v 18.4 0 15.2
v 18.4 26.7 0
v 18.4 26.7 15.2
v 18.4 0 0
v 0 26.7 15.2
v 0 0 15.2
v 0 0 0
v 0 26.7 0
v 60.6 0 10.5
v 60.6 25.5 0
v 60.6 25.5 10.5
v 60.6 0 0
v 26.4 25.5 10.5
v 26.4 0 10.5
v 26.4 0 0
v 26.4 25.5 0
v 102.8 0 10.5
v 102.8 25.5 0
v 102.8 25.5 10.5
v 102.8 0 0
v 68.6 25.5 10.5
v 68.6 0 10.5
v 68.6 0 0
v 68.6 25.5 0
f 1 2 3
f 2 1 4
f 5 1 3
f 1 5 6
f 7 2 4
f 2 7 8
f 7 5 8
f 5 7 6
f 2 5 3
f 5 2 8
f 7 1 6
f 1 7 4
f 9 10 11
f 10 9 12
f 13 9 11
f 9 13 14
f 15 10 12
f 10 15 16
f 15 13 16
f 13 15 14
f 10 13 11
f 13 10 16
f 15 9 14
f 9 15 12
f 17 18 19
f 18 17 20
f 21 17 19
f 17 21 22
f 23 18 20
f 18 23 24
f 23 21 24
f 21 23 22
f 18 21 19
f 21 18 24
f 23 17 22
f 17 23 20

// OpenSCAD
// 미니어처 화물 박스 (실물 /10) — 프린트용
// 단위 mm. OpenSCAD F6(렌더) 후 F7(Export STL).
// 편하중은 기하 중심으로 판정 → 솔리드로 뽑아도 무방(shell=0).

scale_k = 10;          // 축척비

// 실물 치수 mm [W, D, H]
box_2   = [184, 267, 152];   // 2호  x1
box_2_1 = [342, 255, 105];   // 2-1호 x2

shell   = 0;           // 0 = 솔리드. >0이면 그 두께(mm)로 속 빈 셸(필라멘트 절감)
gap     = 8;           // 베드에서 부품 간 간격

module mini_box(real_mm) {
  d = [ for (v = real_mm) v/scale_k ];
  if (shell <= 0)
    cube(d);
  else
    difference() {
      cube(d);
      translate([shell, shell, shell])
        cube([d[0]-2*shell, d[1]-2*shell, d[2]-2*shell]); // 윗면 열린 셸
    }
}

// 한 베드에 3개(2호 1 + 2-1호 2) 나란히 배치
mini_box(box_2);
translate([box_2[0]/scale_k + gap, 0, 0]) mini_box(box_2_1);
translate([box_2[0]/scale_k + box_2_1[0]/scale_k + 2*gap, 0, 0]) mini_box(box_2_1);
